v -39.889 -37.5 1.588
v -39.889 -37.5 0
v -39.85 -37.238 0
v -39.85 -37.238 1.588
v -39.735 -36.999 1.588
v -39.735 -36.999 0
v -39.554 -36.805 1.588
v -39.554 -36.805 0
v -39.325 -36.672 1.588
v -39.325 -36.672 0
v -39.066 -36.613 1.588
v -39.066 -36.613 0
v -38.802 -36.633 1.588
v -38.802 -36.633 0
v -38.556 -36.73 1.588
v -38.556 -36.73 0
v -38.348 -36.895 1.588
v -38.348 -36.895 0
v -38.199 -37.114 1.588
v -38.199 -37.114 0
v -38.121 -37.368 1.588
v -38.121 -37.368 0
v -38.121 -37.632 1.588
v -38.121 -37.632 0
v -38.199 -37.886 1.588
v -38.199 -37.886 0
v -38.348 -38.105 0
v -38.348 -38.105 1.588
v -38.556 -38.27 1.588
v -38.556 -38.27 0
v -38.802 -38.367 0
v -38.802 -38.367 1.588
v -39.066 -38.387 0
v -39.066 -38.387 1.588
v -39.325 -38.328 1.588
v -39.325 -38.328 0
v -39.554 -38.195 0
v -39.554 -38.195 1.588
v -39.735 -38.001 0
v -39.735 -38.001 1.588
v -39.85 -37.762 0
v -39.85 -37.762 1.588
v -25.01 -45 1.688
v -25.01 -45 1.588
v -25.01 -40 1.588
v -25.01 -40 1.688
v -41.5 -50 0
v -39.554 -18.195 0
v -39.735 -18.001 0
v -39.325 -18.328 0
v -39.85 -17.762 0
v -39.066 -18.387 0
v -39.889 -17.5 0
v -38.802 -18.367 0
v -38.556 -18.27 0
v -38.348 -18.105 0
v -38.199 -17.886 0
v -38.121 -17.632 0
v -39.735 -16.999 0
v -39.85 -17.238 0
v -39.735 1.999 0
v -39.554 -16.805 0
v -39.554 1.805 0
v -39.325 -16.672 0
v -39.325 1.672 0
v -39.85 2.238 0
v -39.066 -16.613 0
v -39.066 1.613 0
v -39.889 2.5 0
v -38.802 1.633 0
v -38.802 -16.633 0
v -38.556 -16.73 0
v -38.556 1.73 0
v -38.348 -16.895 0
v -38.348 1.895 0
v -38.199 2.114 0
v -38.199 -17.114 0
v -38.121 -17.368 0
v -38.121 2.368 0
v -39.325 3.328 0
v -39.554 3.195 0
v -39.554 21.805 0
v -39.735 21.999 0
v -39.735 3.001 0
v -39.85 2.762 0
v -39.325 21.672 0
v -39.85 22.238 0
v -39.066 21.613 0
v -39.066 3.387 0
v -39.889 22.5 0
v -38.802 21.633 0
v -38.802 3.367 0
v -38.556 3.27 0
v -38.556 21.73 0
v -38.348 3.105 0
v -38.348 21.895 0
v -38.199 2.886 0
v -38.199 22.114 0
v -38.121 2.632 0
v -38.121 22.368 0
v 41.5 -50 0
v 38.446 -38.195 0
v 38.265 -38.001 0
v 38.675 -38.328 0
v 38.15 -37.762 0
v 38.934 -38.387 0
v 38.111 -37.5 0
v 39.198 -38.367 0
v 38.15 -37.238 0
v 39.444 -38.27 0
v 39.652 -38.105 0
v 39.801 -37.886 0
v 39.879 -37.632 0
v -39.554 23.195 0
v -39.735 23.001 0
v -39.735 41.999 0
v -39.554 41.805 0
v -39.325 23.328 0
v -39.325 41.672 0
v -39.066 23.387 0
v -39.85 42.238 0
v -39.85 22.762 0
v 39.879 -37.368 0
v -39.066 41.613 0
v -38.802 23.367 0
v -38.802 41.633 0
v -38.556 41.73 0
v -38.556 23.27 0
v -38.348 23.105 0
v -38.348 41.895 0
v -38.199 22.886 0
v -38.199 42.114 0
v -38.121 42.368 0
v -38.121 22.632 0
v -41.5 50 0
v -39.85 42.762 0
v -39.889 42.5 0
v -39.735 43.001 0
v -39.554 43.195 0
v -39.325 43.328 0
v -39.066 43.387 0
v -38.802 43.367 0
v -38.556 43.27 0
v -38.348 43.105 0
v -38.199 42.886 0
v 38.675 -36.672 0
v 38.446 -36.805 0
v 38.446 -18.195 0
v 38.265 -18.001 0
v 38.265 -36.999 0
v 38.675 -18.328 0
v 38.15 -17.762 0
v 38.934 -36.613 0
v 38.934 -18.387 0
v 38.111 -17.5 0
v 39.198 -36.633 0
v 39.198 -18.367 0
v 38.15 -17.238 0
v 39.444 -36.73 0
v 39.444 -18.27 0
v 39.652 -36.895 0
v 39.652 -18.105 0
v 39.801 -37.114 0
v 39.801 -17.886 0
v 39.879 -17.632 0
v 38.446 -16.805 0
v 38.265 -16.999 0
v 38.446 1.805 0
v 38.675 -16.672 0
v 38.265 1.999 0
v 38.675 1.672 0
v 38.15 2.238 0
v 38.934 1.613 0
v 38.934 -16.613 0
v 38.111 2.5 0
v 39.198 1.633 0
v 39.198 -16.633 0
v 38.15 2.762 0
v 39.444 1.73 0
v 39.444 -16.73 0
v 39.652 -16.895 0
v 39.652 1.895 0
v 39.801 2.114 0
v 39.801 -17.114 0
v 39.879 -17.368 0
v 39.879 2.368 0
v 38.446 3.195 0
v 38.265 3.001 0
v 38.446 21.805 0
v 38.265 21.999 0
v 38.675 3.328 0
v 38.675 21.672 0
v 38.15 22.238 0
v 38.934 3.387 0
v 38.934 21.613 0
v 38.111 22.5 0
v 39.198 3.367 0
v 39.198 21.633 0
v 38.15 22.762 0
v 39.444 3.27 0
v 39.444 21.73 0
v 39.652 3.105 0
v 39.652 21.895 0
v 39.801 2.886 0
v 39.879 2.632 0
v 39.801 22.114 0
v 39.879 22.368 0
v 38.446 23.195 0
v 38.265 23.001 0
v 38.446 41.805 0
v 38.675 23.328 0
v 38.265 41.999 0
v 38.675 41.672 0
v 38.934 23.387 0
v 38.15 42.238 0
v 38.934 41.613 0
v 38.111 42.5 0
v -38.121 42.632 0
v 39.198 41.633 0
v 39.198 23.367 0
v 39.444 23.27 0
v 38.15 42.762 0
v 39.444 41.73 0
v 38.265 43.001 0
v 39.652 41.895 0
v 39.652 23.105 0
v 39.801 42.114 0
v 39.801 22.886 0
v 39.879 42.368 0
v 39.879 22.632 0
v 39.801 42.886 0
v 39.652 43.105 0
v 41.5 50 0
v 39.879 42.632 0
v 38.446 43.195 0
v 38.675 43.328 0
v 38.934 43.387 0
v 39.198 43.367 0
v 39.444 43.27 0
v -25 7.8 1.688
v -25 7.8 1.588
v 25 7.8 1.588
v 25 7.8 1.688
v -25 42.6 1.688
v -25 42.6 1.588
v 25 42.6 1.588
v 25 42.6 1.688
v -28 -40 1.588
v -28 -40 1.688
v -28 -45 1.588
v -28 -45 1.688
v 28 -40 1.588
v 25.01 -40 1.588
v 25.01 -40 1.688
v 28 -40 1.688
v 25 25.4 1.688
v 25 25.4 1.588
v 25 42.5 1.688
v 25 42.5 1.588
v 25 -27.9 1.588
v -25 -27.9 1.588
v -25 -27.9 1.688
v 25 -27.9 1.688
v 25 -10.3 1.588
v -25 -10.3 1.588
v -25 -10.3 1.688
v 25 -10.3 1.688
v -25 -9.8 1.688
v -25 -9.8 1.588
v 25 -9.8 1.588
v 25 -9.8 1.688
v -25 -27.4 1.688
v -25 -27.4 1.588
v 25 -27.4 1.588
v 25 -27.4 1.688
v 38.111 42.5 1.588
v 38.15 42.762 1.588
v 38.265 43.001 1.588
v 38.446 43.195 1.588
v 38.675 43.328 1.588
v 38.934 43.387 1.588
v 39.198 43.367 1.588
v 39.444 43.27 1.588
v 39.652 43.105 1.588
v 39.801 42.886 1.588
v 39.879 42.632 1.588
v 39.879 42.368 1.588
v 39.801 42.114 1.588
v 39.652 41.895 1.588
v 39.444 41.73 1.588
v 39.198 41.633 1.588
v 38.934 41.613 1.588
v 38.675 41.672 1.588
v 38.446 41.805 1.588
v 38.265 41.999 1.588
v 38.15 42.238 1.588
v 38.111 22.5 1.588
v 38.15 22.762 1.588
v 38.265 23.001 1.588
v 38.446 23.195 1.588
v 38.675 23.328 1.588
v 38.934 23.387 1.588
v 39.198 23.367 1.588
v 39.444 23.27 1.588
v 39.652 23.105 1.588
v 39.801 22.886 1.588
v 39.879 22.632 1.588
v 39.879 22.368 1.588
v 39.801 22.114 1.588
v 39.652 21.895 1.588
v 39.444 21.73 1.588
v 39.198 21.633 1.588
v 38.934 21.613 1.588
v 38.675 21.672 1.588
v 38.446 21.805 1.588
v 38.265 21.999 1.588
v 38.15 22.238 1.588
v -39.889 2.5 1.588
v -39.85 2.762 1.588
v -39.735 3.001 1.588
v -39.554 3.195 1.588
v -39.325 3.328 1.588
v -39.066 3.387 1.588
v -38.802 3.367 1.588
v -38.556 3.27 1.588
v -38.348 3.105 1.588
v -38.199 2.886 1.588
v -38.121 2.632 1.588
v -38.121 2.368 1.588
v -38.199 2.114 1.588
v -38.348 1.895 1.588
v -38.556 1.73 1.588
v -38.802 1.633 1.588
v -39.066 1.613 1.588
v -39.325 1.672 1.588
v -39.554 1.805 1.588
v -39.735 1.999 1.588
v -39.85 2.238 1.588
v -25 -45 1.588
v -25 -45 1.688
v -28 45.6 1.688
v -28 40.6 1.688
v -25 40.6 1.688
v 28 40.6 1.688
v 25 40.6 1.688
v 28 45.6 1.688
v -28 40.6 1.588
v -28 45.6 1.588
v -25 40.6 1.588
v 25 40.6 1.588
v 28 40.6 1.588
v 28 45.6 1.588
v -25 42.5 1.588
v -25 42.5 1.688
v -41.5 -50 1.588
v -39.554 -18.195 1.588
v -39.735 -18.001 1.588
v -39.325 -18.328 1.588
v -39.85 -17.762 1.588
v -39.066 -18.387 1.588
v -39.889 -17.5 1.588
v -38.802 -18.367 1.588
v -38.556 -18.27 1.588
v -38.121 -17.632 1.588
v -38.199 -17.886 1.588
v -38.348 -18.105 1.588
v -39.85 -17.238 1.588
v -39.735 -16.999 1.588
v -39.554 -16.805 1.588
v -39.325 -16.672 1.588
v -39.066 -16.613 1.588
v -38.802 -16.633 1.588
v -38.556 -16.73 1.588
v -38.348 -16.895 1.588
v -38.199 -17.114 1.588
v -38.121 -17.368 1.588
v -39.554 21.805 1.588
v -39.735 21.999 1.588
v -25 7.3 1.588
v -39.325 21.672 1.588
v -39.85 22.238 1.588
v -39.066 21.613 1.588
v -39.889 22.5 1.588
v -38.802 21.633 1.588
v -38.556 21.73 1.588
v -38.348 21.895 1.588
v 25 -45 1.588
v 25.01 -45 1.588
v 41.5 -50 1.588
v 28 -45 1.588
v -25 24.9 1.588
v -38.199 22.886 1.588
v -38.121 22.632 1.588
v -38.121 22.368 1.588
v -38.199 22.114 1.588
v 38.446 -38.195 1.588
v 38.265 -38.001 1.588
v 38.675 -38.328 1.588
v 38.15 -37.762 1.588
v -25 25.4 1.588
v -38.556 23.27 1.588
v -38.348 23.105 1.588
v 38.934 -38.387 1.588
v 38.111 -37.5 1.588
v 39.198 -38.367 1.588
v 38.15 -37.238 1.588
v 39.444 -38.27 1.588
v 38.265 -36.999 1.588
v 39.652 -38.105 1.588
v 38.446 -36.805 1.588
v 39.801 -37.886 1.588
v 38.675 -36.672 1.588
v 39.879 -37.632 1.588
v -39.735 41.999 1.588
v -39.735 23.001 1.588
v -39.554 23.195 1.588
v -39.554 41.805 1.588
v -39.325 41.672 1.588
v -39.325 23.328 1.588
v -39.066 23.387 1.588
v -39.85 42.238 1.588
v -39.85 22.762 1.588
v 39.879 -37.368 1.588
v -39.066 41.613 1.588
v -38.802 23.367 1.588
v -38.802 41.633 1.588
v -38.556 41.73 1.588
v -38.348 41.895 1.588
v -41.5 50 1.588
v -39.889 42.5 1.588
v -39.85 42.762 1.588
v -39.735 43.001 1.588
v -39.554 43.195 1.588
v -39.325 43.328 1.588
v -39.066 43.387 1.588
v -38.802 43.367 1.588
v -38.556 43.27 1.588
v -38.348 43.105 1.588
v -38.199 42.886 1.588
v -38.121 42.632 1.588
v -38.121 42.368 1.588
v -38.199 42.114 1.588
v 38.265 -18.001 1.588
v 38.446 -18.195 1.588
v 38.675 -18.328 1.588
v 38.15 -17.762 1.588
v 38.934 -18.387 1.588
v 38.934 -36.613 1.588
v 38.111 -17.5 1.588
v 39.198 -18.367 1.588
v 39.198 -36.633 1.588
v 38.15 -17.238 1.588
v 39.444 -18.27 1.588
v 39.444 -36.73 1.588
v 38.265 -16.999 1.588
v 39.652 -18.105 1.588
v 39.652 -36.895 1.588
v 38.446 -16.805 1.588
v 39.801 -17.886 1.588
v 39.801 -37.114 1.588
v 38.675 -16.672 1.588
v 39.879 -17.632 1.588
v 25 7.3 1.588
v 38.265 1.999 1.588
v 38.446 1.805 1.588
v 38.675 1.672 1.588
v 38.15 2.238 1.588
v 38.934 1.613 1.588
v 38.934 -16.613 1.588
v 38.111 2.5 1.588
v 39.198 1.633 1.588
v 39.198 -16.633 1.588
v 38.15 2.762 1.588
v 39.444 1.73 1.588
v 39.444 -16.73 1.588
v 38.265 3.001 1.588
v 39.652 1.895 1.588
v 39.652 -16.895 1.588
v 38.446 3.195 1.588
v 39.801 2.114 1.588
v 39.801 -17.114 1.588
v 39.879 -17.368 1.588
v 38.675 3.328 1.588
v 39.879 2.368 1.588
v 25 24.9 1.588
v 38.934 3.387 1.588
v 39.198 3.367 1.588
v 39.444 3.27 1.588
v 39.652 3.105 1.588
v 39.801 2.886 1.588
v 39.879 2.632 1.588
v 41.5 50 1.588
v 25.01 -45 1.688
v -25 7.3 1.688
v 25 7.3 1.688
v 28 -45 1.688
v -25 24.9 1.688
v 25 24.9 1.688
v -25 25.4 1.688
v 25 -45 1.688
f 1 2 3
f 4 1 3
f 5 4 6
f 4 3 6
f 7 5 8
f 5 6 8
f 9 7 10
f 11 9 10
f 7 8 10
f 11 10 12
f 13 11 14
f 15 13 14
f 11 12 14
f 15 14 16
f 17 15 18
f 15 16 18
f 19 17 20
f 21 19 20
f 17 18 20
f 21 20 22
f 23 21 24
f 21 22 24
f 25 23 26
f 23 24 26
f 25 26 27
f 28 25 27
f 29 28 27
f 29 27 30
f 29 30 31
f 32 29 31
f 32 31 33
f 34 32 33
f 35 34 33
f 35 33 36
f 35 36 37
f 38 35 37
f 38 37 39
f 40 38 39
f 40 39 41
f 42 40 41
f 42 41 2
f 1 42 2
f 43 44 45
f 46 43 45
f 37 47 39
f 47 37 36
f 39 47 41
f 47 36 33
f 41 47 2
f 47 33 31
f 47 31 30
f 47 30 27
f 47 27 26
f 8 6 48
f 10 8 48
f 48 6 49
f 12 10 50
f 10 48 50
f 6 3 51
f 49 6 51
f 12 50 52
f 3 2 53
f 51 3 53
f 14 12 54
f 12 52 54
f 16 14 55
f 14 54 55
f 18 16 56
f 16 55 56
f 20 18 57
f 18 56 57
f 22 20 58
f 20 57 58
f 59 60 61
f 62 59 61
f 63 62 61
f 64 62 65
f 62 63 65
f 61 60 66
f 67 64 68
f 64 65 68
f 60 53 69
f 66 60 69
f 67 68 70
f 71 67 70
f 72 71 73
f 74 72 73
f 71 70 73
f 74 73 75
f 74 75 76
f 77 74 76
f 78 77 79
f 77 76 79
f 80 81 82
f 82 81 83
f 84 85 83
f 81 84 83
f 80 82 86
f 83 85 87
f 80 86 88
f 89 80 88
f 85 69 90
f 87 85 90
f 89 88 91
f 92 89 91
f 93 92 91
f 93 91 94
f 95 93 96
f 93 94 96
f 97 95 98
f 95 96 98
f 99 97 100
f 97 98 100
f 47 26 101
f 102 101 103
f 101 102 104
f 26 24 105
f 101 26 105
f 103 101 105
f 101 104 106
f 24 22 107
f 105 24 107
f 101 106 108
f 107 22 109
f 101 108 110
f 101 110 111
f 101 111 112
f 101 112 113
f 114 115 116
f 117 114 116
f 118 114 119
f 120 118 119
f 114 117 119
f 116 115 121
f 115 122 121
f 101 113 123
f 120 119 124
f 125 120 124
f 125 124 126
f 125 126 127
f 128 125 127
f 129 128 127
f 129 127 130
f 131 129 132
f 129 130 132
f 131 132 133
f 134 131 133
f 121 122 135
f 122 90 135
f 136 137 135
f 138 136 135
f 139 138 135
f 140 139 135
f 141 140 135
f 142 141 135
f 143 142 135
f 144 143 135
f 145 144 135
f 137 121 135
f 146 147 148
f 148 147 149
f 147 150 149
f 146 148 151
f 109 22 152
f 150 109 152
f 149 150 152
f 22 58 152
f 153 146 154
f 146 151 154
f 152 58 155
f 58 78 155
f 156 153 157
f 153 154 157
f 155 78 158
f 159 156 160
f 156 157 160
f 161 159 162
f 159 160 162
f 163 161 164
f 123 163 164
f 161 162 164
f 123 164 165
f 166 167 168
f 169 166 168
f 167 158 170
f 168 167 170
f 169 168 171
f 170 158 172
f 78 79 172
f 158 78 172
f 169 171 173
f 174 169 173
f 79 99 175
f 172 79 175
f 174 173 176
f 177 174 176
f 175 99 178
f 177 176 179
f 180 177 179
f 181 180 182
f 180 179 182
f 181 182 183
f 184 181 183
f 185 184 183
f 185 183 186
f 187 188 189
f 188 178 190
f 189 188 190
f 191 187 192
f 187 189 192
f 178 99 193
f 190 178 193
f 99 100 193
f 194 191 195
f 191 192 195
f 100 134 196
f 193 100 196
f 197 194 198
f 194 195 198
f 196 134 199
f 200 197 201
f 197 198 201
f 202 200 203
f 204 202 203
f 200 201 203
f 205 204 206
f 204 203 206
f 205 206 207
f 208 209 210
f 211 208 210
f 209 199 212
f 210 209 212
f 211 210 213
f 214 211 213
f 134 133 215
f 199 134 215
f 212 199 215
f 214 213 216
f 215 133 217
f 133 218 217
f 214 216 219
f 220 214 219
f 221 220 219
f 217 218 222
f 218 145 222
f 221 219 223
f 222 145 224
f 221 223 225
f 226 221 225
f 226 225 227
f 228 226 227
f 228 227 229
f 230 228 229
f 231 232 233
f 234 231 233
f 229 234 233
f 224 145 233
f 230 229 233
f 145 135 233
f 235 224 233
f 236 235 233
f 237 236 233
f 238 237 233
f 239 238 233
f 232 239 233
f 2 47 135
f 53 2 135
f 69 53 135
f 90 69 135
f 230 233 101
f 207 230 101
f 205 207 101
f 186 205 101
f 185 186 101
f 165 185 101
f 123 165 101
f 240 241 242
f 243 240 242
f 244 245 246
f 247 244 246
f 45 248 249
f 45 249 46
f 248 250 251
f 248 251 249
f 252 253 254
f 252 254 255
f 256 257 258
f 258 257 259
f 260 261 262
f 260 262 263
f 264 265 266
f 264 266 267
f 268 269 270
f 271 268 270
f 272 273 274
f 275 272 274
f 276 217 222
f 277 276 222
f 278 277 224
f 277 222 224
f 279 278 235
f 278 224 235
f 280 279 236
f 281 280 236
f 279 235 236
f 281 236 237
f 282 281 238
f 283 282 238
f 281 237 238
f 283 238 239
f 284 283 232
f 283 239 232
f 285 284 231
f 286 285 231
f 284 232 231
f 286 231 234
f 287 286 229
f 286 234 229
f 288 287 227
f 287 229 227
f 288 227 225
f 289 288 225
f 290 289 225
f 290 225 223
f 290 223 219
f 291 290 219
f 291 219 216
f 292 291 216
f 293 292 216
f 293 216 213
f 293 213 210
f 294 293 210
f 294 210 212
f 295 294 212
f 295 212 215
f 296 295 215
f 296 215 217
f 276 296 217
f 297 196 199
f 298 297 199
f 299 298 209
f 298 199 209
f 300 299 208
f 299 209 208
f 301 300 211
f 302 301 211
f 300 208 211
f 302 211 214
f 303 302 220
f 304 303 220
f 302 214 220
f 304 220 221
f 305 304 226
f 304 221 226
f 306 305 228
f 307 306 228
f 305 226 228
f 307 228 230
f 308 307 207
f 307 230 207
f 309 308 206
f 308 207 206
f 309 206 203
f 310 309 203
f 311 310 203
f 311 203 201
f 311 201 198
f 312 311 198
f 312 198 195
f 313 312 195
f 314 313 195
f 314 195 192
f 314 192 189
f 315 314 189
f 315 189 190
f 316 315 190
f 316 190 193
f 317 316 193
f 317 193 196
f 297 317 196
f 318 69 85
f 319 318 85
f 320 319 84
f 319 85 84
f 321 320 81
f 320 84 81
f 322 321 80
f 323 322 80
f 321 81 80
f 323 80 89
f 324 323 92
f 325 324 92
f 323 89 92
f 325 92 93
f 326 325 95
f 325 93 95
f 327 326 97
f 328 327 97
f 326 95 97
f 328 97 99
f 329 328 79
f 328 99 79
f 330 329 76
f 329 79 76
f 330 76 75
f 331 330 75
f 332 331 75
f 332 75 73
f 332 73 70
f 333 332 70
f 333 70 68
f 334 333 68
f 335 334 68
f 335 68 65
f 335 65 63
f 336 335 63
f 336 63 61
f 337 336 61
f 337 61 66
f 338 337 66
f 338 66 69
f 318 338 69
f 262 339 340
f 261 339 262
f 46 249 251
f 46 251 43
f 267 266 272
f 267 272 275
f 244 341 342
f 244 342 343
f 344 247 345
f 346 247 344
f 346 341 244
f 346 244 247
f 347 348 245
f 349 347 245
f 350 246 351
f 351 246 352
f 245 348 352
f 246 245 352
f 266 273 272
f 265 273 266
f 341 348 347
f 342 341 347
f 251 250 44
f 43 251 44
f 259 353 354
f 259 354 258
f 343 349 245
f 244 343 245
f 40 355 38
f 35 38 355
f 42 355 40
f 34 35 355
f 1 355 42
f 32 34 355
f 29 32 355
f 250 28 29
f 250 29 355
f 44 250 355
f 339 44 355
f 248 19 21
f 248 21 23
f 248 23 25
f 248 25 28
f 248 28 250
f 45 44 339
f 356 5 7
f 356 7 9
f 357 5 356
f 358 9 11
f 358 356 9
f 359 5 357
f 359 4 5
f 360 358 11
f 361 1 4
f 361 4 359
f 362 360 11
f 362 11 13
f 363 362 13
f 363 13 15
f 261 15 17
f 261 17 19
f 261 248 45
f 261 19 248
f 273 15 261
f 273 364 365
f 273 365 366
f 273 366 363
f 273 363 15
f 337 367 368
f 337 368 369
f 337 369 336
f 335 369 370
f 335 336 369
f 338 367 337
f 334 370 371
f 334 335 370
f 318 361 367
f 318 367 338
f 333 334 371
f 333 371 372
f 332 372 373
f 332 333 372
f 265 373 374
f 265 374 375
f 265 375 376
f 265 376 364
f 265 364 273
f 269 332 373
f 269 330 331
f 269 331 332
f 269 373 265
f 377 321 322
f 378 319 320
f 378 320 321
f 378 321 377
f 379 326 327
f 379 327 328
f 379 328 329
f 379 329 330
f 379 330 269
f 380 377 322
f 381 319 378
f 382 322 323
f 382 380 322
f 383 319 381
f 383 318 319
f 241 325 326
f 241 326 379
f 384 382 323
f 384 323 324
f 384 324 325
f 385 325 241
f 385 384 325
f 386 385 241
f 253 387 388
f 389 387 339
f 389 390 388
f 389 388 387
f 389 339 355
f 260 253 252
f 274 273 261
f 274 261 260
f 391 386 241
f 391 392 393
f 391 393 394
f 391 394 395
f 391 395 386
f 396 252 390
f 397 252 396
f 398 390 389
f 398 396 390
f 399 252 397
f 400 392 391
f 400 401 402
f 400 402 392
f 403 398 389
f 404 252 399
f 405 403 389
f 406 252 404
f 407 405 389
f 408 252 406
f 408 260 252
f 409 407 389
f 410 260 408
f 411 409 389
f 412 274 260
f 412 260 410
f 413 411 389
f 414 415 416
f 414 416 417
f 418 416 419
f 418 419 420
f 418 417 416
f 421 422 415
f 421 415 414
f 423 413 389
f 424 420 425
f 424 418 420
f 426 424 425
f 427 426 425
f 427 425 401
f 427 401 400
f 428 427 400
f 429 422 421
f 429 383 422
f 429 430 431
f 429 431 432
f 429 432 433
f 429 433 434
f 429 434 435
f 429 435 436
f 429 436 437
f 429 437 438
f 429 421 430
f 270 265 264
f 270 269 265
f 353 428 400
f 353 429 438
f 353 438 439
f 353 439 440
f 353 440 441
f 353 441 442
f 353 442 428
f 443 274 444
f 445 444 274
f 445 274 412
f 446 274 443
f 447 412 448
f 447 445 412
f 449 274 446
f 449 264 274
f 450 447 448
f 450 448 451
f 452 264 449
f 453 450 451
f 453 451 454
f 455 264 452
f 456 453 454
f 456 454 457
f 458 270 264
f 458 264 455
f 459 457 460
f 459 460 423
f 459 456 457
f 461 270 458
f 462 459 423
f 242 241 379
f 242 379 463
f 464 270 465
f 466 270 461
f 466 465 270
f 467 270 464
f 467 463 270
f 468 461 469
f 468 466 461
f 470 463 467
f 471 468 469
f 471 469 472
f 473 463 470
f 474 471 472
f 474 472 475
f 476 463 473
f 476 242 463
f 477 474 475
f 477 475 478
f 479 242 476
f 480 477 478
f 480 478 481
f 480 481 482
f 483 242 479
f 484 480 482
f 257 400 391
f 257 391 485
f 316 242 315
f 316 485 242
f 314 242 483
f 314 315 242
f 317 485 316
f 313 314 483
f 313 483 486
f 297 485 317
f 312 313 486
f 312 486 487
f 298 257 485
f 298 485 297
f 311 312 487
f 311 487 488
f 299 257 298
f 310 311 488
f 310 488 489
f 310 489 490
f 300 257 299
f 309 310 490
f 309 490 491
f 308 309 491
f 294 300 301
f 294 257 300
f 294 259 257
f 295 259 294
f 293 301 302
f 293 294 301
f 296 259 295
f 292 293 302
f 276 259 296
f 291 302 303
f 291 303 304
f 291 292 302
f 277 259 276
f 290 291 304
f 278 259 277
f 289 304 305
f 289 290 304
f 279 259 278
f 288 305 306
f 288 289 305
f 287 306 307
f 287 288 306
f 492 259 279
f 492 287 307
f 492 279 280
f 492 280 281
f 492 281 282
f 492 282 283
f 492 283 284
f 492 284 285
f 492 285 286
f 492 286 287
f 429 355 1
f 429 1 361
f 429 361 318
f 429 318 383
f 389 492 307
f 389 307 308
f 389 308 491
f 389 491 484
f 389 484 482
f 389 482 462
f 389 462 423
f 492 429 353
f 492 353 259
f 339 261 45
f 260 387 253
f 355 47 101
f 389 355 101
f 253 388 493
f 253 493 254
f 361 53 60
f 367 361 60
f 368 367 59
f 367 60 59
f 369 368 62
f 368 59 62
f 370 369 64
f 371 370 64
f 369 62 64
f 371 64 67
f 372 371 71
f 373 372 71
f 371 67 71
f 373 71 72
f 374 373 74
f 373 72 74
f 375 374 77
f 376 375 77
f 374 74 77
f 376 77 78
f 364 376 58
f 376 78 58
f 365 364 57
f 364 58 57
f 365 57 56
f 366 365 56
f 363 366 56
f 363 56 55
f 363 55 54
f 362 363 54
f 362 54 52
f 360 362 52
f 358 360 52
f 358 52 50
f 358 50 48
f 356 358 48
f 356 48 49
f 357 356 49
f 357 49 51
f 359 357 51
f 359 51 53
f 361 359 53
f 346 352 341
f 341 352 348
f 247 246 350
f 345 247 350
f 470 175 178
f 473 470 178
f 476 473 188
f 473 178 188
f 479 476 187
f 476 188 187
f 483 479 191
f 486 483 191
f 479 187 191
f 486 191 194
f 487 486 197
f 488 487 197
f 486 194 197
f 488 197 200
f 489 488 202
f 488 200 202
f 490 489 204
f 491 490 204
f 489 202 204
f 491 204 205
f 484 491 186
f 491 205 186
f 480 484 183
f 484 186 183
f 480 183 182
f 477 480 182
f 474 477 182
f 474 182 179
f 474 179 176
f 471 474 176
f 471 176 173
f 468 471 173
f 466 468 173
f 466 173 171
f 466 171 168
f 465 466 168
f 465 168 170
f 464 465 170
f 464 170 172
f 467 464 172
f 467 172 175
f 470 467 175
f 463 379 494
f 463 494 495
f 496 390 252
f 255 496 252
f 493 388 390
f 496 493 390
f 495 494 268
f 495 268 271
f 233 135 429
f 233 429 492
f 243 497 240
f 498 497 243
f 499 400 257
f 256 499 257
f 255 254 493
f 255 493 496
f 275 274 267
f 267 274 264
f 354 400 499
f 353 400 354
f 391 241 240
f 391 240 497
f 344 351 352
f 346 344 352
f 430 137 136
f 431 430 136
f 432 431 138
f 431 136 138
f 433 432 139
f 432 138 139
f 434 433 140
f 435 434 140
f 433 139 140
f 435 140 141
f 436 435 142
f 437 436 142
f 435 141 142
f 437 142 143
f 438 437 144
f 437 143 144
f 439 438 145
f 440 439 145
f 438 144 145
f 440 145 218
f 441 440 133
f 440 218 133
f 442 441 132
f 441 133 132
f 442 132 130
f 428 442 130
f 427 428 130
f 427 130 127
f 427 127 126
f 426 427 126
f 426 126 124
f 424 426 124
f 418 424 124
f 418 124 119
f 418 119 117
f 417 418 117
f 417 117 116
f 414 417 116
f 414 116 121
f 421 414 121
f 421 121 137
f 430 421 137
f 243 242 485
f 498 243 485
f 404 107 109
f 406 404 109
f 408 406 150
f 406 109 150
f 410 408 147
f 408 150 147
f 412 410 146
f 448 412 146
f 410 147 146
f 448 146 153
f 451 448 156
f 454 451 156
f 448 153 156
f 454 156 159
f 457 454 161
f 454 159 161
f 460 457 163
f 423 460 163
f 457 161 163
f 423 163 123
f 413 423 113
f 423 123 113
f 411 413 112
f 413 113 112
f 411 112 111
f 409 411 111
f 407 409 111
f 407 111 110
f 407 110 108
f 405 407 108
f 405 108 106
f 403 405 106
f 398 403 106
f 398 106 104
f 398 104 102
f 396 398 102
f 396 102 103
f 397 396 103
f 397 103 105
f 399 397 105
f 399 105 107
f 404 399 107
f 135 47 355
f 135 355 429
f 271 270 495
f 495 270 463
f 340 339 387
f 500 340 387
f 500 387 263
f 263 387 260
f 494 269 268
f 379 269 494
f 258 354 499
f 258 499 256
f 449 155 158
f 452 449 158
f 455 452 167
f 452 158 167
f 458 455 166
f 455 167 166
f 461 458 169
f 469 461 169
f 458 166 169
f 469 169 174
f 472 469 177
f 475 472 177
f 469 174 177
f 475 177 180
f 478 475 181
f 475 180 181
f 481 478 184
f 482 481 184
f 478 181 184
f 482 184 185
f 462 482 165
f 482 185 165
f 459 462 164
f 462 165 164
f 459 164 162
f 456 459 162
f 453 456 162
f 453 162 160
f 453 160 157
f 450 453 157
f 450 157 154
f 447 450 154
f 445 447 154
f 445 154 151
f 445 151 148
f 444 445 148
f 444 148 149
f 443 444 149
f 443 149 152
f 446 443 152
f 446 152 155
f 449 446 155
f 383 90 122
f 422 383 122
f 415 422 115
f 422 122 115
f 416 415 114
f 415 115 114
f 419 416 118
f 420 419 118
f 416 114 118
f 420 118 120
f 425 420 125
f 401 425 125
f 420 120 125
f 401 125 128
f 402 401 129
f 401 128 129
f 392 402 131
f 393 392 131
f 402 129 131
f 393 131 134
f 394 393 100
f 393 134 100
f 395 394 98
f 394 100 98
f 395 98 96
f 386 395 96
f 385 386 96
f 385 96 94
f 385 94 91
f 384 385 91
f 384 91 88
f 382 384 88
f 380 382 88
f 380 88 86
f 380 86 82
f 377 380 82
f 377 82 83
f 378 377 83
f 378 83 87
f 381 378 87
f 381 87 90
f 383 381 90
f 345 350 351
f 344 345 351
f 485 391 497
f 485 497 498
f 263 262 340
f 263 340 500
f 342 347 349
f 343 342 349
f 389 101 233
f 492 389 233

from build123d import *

# Parameters (mm, degrees)
SKETCH1_W                 = 83
SKETCH1_H                 = 100
BOSS_EXTRUDE1_DEPTH       = 1.5875
F_0_CLEARANCE_HOLE1_D     = 1.778
F_0_CLEARANCE_HOLE1_DEPTH = 3.175
F_0_CLEARANCE_HOLE1_TIP   = 0.53416509
SKETCH5_W                 = 50
SKETCH5_H                 = 17.1
BOSS_EXTRUDE3_DEPTH       = 0.1
BOSS_EXTRUDE4_DEPTH       = 0.1
SKETCH7_W                 = 2.99
SKETCH7_H                 = 5
BOSS_EXTRUDE5_DEPTH       = 0.1


with BuildPart() as part:
    # Sketch1 → Boss-Extrude1 (new body)
    with BuildSketch(Plane.XY):
        Rectangle(SKETCH1_W, SKETCH1_H)
    extrude(amount=BOSS_EXTRUDE1_DEPTH)

    # #0 Clearance Hole1
    with Locations(Plane.XY.offset(1.5875)):
        with Locations((-39, 42.5), (-39, 22.5), (-39, 2.5), (-39, -17.5), (-39, -37.5), (39, -37.5), (39, -17.5), (39, 2.5), (39, 22.5), (39, 42.5)):
            Hole(F_0_CLEARANCE_HOLE1_D / 2, depth=F_0_CLEARANCE_HOLE1_DEPTH)
            with Locations((0, 0, -(F_0_CLEARANCE_HOLE1_DEPTH + F_0_CLEARANCE_HOLE1_TIP / 2))):  # 118° drill point
                Cone(0, F_0_CLEARANCE_HOLE1_D / 2, F_0_CLEARANCE_HOLE1_TIP, mode=Mode.SUBTRACT)

    # Sketch5 → Boss-Extrude3 (add)
    with BuildSketch(Plane.XY.offset(1.5875)):
        with Locations((0, 16.35)):
            Rectangle(SKETCH5_W, SKETCH5_H)
        with Locations((0, 33.95)):
            Rectangle(SKETCH5_W, SKETCH5_H)
        with Locations((0, -1.25)):
            Rectangle(SKETCH5_W, SKETCH5_H)
        with Locations((0, -18.85)):
            Rectangle(SKETCH5_W, SKETCH5_H)
        with Locations((0, -36.45)):
            Rectangle(SKETCH5_W, SKETCH5_H)
    extrude(amount=BOSS_EXTRUDE3_DEPTH)

    # Sketch7 → Boss-Extrude5 (add)
    with BuildSketch(Plane.XY.offset(1.5875)):
        with Locations((26.505, -42.5)):
            Rectangle(SKETCH7_W, SKETCH7_H)
        with Locations((-26.505, -42.5)):
            Rectangle(SKETCH7_W, SKETCH7_H)
    extrude(amount=BOSS_EXTRUDE5_DEPTH)


with BuildPart() as body_2:
    # Sketch6 → Boss-Extrude4 (new body)
    with BuildSketch(Plane.XY.offset(1.5875)):
        Polygon((-25, 42.6), (25, 42.6), (25, 40.6), (28, 40.6), (28, 42.6), (28, 45.6), (-28, 45.6), (-28, 42.6), (-28, 40.6), (-25, 40.6), align=None)
    extrude(amount=BOSS_EXTRUDE4_DEPTH)


solid = Compound([part.part, body_2.part])
